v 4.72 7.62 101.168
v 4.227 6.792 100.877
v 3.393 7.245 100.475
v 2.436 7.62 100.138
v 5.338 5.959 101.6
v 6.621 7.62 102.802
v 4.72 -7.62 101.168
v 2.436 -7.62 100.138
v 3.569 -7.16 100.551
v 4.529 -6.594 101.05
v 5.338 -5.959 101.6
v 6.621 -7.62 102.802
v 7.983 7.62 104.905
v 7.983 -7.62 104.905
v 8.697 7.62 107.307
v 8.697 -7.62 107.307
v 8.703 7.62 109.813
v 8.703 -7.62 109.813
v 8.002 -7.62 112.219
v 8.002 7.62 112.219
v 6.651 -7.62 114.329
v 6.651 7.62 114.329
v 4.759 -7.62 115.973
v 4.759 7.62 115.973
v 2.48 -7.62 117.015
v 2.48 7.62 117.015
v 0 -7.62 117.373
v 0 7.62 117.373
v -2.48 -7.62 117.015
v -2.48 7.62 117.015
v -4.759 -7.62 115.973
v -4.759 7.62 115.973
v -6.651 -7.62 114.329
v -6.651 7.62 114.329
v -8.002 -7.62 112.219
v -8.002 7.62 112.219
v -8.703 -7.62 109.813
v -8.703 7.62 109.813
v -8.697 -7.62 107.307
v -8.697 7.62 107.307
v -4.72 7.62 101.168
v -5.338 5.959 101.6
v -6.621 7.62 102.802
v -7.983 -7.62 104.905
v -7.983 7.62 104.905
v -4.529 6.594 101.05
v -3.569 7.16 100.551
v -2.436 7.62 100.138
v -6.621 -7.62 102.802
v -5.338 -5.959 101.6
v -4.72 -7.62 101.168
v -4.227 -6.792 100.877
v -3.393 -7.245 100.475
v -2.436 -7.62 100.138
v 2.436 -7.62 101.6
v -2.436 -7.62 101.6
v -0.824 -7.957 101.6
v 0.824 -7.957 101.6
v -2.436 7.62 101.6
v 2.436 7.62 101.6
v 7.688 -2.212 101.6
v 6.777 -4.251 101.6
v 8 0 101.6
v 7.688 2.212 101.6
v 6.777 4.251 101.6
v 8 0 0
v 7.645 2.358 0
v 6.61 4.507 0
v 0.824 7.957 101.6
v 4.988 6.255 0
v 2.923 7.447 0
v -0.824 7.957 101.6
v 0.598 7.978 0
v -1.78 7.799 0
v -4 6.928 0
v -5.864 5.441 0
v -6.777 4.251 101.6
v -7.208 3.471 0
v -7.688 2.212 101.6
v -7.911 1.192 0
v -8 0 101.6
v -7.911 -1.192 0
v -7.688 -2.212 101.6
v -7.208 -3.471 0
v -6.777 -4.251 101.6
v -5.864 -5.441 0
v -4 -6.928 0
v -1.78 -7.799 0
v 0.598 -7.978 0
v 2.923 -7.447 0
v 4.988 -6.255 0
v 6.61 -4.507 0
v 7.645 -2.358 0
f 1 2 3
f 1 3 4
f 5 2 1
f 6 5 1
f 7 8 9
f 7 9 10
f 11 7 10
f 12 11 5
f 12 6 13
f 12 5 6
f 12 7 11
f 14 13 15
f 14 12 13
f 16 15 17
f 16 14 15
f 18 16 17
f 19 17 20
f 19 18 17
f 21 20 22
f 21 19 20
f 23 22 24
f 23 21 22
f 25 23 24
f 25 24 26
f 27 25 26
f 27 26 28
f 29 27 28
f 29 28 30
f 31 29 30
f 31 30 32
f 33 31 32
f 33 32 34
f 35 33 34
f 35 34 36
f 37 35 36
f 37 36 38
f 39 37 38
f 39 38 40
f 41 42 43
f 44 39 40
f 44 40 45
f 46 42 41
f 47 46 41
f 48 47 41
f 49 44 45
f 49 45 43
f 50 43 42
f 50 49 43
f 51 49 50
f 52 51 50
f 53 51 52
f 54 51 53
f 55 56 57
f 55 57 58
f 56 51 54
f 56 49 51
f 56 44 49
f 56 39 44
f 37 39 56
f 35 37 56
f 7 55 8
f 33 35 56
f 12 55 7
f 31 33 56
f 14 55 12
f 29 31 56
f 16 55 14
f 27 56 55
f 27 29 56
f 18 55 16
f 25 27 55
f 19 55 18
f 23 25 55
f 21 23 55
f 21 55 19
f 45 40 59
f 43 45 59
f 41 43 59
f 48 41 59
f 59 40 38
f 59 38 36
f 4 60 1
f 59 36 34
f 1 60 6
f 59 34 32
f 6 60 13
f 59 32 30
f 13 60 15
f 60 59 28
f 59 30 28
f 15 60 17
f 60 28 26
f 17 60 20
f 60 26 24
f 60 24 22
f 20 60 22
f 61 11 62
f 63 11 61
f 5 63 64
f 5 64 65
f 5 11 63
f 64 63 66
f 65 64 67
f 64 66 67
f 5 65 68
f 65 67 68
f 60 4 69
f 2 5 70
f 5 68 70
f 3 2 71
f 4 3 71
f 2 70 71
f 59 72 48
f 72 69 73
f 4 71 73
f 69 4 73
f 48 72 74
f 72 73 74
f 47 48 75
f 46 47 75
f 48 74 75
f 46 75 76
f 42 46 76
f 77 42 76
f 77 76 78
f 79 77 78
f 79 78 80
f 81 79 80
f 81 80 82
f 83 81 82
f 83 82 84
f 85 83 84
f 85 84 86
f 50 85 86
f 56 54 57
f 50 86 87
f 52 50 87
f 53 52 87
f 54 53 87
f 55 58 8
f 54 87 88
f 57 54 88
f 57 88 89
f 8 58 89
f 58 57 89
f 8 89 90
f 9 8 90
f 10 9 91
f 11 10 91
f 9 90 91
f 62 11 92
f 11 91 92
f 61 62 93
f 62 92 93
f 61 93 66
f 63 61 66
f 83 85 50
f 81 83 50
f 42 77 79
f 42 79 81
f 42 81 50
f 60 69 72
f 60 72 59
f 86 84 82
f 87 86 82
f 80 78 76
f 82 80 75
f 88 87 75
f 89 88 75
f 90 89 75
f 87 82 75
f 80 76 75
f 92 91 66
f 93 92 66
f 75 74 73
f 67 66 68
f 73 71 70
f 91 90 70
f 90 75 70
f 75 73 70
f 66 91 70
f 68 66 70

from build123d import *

# Parameters (mm, degrees)
F0_R     = 8
F1_DEPTH = 101.6
F2_R     = 8.789608
F3_DEPTH = 7.62


with BuildPart() as f1:
    # F0 (on Top) → F1 (new body)
    with BuildSketch(Plane.XY):
        Circle(F0_R)
    extrude(amount=F1_DEPTH)

    # F2 (on Front) → F3 (join, symmetric)
    with BuildSketch(Plane.XZ):
        with Locations((0, 108.582966)):
            Circle(F2_R)
    extrude(amount=F3_DEPTH, both=True)


solid = f1.part
